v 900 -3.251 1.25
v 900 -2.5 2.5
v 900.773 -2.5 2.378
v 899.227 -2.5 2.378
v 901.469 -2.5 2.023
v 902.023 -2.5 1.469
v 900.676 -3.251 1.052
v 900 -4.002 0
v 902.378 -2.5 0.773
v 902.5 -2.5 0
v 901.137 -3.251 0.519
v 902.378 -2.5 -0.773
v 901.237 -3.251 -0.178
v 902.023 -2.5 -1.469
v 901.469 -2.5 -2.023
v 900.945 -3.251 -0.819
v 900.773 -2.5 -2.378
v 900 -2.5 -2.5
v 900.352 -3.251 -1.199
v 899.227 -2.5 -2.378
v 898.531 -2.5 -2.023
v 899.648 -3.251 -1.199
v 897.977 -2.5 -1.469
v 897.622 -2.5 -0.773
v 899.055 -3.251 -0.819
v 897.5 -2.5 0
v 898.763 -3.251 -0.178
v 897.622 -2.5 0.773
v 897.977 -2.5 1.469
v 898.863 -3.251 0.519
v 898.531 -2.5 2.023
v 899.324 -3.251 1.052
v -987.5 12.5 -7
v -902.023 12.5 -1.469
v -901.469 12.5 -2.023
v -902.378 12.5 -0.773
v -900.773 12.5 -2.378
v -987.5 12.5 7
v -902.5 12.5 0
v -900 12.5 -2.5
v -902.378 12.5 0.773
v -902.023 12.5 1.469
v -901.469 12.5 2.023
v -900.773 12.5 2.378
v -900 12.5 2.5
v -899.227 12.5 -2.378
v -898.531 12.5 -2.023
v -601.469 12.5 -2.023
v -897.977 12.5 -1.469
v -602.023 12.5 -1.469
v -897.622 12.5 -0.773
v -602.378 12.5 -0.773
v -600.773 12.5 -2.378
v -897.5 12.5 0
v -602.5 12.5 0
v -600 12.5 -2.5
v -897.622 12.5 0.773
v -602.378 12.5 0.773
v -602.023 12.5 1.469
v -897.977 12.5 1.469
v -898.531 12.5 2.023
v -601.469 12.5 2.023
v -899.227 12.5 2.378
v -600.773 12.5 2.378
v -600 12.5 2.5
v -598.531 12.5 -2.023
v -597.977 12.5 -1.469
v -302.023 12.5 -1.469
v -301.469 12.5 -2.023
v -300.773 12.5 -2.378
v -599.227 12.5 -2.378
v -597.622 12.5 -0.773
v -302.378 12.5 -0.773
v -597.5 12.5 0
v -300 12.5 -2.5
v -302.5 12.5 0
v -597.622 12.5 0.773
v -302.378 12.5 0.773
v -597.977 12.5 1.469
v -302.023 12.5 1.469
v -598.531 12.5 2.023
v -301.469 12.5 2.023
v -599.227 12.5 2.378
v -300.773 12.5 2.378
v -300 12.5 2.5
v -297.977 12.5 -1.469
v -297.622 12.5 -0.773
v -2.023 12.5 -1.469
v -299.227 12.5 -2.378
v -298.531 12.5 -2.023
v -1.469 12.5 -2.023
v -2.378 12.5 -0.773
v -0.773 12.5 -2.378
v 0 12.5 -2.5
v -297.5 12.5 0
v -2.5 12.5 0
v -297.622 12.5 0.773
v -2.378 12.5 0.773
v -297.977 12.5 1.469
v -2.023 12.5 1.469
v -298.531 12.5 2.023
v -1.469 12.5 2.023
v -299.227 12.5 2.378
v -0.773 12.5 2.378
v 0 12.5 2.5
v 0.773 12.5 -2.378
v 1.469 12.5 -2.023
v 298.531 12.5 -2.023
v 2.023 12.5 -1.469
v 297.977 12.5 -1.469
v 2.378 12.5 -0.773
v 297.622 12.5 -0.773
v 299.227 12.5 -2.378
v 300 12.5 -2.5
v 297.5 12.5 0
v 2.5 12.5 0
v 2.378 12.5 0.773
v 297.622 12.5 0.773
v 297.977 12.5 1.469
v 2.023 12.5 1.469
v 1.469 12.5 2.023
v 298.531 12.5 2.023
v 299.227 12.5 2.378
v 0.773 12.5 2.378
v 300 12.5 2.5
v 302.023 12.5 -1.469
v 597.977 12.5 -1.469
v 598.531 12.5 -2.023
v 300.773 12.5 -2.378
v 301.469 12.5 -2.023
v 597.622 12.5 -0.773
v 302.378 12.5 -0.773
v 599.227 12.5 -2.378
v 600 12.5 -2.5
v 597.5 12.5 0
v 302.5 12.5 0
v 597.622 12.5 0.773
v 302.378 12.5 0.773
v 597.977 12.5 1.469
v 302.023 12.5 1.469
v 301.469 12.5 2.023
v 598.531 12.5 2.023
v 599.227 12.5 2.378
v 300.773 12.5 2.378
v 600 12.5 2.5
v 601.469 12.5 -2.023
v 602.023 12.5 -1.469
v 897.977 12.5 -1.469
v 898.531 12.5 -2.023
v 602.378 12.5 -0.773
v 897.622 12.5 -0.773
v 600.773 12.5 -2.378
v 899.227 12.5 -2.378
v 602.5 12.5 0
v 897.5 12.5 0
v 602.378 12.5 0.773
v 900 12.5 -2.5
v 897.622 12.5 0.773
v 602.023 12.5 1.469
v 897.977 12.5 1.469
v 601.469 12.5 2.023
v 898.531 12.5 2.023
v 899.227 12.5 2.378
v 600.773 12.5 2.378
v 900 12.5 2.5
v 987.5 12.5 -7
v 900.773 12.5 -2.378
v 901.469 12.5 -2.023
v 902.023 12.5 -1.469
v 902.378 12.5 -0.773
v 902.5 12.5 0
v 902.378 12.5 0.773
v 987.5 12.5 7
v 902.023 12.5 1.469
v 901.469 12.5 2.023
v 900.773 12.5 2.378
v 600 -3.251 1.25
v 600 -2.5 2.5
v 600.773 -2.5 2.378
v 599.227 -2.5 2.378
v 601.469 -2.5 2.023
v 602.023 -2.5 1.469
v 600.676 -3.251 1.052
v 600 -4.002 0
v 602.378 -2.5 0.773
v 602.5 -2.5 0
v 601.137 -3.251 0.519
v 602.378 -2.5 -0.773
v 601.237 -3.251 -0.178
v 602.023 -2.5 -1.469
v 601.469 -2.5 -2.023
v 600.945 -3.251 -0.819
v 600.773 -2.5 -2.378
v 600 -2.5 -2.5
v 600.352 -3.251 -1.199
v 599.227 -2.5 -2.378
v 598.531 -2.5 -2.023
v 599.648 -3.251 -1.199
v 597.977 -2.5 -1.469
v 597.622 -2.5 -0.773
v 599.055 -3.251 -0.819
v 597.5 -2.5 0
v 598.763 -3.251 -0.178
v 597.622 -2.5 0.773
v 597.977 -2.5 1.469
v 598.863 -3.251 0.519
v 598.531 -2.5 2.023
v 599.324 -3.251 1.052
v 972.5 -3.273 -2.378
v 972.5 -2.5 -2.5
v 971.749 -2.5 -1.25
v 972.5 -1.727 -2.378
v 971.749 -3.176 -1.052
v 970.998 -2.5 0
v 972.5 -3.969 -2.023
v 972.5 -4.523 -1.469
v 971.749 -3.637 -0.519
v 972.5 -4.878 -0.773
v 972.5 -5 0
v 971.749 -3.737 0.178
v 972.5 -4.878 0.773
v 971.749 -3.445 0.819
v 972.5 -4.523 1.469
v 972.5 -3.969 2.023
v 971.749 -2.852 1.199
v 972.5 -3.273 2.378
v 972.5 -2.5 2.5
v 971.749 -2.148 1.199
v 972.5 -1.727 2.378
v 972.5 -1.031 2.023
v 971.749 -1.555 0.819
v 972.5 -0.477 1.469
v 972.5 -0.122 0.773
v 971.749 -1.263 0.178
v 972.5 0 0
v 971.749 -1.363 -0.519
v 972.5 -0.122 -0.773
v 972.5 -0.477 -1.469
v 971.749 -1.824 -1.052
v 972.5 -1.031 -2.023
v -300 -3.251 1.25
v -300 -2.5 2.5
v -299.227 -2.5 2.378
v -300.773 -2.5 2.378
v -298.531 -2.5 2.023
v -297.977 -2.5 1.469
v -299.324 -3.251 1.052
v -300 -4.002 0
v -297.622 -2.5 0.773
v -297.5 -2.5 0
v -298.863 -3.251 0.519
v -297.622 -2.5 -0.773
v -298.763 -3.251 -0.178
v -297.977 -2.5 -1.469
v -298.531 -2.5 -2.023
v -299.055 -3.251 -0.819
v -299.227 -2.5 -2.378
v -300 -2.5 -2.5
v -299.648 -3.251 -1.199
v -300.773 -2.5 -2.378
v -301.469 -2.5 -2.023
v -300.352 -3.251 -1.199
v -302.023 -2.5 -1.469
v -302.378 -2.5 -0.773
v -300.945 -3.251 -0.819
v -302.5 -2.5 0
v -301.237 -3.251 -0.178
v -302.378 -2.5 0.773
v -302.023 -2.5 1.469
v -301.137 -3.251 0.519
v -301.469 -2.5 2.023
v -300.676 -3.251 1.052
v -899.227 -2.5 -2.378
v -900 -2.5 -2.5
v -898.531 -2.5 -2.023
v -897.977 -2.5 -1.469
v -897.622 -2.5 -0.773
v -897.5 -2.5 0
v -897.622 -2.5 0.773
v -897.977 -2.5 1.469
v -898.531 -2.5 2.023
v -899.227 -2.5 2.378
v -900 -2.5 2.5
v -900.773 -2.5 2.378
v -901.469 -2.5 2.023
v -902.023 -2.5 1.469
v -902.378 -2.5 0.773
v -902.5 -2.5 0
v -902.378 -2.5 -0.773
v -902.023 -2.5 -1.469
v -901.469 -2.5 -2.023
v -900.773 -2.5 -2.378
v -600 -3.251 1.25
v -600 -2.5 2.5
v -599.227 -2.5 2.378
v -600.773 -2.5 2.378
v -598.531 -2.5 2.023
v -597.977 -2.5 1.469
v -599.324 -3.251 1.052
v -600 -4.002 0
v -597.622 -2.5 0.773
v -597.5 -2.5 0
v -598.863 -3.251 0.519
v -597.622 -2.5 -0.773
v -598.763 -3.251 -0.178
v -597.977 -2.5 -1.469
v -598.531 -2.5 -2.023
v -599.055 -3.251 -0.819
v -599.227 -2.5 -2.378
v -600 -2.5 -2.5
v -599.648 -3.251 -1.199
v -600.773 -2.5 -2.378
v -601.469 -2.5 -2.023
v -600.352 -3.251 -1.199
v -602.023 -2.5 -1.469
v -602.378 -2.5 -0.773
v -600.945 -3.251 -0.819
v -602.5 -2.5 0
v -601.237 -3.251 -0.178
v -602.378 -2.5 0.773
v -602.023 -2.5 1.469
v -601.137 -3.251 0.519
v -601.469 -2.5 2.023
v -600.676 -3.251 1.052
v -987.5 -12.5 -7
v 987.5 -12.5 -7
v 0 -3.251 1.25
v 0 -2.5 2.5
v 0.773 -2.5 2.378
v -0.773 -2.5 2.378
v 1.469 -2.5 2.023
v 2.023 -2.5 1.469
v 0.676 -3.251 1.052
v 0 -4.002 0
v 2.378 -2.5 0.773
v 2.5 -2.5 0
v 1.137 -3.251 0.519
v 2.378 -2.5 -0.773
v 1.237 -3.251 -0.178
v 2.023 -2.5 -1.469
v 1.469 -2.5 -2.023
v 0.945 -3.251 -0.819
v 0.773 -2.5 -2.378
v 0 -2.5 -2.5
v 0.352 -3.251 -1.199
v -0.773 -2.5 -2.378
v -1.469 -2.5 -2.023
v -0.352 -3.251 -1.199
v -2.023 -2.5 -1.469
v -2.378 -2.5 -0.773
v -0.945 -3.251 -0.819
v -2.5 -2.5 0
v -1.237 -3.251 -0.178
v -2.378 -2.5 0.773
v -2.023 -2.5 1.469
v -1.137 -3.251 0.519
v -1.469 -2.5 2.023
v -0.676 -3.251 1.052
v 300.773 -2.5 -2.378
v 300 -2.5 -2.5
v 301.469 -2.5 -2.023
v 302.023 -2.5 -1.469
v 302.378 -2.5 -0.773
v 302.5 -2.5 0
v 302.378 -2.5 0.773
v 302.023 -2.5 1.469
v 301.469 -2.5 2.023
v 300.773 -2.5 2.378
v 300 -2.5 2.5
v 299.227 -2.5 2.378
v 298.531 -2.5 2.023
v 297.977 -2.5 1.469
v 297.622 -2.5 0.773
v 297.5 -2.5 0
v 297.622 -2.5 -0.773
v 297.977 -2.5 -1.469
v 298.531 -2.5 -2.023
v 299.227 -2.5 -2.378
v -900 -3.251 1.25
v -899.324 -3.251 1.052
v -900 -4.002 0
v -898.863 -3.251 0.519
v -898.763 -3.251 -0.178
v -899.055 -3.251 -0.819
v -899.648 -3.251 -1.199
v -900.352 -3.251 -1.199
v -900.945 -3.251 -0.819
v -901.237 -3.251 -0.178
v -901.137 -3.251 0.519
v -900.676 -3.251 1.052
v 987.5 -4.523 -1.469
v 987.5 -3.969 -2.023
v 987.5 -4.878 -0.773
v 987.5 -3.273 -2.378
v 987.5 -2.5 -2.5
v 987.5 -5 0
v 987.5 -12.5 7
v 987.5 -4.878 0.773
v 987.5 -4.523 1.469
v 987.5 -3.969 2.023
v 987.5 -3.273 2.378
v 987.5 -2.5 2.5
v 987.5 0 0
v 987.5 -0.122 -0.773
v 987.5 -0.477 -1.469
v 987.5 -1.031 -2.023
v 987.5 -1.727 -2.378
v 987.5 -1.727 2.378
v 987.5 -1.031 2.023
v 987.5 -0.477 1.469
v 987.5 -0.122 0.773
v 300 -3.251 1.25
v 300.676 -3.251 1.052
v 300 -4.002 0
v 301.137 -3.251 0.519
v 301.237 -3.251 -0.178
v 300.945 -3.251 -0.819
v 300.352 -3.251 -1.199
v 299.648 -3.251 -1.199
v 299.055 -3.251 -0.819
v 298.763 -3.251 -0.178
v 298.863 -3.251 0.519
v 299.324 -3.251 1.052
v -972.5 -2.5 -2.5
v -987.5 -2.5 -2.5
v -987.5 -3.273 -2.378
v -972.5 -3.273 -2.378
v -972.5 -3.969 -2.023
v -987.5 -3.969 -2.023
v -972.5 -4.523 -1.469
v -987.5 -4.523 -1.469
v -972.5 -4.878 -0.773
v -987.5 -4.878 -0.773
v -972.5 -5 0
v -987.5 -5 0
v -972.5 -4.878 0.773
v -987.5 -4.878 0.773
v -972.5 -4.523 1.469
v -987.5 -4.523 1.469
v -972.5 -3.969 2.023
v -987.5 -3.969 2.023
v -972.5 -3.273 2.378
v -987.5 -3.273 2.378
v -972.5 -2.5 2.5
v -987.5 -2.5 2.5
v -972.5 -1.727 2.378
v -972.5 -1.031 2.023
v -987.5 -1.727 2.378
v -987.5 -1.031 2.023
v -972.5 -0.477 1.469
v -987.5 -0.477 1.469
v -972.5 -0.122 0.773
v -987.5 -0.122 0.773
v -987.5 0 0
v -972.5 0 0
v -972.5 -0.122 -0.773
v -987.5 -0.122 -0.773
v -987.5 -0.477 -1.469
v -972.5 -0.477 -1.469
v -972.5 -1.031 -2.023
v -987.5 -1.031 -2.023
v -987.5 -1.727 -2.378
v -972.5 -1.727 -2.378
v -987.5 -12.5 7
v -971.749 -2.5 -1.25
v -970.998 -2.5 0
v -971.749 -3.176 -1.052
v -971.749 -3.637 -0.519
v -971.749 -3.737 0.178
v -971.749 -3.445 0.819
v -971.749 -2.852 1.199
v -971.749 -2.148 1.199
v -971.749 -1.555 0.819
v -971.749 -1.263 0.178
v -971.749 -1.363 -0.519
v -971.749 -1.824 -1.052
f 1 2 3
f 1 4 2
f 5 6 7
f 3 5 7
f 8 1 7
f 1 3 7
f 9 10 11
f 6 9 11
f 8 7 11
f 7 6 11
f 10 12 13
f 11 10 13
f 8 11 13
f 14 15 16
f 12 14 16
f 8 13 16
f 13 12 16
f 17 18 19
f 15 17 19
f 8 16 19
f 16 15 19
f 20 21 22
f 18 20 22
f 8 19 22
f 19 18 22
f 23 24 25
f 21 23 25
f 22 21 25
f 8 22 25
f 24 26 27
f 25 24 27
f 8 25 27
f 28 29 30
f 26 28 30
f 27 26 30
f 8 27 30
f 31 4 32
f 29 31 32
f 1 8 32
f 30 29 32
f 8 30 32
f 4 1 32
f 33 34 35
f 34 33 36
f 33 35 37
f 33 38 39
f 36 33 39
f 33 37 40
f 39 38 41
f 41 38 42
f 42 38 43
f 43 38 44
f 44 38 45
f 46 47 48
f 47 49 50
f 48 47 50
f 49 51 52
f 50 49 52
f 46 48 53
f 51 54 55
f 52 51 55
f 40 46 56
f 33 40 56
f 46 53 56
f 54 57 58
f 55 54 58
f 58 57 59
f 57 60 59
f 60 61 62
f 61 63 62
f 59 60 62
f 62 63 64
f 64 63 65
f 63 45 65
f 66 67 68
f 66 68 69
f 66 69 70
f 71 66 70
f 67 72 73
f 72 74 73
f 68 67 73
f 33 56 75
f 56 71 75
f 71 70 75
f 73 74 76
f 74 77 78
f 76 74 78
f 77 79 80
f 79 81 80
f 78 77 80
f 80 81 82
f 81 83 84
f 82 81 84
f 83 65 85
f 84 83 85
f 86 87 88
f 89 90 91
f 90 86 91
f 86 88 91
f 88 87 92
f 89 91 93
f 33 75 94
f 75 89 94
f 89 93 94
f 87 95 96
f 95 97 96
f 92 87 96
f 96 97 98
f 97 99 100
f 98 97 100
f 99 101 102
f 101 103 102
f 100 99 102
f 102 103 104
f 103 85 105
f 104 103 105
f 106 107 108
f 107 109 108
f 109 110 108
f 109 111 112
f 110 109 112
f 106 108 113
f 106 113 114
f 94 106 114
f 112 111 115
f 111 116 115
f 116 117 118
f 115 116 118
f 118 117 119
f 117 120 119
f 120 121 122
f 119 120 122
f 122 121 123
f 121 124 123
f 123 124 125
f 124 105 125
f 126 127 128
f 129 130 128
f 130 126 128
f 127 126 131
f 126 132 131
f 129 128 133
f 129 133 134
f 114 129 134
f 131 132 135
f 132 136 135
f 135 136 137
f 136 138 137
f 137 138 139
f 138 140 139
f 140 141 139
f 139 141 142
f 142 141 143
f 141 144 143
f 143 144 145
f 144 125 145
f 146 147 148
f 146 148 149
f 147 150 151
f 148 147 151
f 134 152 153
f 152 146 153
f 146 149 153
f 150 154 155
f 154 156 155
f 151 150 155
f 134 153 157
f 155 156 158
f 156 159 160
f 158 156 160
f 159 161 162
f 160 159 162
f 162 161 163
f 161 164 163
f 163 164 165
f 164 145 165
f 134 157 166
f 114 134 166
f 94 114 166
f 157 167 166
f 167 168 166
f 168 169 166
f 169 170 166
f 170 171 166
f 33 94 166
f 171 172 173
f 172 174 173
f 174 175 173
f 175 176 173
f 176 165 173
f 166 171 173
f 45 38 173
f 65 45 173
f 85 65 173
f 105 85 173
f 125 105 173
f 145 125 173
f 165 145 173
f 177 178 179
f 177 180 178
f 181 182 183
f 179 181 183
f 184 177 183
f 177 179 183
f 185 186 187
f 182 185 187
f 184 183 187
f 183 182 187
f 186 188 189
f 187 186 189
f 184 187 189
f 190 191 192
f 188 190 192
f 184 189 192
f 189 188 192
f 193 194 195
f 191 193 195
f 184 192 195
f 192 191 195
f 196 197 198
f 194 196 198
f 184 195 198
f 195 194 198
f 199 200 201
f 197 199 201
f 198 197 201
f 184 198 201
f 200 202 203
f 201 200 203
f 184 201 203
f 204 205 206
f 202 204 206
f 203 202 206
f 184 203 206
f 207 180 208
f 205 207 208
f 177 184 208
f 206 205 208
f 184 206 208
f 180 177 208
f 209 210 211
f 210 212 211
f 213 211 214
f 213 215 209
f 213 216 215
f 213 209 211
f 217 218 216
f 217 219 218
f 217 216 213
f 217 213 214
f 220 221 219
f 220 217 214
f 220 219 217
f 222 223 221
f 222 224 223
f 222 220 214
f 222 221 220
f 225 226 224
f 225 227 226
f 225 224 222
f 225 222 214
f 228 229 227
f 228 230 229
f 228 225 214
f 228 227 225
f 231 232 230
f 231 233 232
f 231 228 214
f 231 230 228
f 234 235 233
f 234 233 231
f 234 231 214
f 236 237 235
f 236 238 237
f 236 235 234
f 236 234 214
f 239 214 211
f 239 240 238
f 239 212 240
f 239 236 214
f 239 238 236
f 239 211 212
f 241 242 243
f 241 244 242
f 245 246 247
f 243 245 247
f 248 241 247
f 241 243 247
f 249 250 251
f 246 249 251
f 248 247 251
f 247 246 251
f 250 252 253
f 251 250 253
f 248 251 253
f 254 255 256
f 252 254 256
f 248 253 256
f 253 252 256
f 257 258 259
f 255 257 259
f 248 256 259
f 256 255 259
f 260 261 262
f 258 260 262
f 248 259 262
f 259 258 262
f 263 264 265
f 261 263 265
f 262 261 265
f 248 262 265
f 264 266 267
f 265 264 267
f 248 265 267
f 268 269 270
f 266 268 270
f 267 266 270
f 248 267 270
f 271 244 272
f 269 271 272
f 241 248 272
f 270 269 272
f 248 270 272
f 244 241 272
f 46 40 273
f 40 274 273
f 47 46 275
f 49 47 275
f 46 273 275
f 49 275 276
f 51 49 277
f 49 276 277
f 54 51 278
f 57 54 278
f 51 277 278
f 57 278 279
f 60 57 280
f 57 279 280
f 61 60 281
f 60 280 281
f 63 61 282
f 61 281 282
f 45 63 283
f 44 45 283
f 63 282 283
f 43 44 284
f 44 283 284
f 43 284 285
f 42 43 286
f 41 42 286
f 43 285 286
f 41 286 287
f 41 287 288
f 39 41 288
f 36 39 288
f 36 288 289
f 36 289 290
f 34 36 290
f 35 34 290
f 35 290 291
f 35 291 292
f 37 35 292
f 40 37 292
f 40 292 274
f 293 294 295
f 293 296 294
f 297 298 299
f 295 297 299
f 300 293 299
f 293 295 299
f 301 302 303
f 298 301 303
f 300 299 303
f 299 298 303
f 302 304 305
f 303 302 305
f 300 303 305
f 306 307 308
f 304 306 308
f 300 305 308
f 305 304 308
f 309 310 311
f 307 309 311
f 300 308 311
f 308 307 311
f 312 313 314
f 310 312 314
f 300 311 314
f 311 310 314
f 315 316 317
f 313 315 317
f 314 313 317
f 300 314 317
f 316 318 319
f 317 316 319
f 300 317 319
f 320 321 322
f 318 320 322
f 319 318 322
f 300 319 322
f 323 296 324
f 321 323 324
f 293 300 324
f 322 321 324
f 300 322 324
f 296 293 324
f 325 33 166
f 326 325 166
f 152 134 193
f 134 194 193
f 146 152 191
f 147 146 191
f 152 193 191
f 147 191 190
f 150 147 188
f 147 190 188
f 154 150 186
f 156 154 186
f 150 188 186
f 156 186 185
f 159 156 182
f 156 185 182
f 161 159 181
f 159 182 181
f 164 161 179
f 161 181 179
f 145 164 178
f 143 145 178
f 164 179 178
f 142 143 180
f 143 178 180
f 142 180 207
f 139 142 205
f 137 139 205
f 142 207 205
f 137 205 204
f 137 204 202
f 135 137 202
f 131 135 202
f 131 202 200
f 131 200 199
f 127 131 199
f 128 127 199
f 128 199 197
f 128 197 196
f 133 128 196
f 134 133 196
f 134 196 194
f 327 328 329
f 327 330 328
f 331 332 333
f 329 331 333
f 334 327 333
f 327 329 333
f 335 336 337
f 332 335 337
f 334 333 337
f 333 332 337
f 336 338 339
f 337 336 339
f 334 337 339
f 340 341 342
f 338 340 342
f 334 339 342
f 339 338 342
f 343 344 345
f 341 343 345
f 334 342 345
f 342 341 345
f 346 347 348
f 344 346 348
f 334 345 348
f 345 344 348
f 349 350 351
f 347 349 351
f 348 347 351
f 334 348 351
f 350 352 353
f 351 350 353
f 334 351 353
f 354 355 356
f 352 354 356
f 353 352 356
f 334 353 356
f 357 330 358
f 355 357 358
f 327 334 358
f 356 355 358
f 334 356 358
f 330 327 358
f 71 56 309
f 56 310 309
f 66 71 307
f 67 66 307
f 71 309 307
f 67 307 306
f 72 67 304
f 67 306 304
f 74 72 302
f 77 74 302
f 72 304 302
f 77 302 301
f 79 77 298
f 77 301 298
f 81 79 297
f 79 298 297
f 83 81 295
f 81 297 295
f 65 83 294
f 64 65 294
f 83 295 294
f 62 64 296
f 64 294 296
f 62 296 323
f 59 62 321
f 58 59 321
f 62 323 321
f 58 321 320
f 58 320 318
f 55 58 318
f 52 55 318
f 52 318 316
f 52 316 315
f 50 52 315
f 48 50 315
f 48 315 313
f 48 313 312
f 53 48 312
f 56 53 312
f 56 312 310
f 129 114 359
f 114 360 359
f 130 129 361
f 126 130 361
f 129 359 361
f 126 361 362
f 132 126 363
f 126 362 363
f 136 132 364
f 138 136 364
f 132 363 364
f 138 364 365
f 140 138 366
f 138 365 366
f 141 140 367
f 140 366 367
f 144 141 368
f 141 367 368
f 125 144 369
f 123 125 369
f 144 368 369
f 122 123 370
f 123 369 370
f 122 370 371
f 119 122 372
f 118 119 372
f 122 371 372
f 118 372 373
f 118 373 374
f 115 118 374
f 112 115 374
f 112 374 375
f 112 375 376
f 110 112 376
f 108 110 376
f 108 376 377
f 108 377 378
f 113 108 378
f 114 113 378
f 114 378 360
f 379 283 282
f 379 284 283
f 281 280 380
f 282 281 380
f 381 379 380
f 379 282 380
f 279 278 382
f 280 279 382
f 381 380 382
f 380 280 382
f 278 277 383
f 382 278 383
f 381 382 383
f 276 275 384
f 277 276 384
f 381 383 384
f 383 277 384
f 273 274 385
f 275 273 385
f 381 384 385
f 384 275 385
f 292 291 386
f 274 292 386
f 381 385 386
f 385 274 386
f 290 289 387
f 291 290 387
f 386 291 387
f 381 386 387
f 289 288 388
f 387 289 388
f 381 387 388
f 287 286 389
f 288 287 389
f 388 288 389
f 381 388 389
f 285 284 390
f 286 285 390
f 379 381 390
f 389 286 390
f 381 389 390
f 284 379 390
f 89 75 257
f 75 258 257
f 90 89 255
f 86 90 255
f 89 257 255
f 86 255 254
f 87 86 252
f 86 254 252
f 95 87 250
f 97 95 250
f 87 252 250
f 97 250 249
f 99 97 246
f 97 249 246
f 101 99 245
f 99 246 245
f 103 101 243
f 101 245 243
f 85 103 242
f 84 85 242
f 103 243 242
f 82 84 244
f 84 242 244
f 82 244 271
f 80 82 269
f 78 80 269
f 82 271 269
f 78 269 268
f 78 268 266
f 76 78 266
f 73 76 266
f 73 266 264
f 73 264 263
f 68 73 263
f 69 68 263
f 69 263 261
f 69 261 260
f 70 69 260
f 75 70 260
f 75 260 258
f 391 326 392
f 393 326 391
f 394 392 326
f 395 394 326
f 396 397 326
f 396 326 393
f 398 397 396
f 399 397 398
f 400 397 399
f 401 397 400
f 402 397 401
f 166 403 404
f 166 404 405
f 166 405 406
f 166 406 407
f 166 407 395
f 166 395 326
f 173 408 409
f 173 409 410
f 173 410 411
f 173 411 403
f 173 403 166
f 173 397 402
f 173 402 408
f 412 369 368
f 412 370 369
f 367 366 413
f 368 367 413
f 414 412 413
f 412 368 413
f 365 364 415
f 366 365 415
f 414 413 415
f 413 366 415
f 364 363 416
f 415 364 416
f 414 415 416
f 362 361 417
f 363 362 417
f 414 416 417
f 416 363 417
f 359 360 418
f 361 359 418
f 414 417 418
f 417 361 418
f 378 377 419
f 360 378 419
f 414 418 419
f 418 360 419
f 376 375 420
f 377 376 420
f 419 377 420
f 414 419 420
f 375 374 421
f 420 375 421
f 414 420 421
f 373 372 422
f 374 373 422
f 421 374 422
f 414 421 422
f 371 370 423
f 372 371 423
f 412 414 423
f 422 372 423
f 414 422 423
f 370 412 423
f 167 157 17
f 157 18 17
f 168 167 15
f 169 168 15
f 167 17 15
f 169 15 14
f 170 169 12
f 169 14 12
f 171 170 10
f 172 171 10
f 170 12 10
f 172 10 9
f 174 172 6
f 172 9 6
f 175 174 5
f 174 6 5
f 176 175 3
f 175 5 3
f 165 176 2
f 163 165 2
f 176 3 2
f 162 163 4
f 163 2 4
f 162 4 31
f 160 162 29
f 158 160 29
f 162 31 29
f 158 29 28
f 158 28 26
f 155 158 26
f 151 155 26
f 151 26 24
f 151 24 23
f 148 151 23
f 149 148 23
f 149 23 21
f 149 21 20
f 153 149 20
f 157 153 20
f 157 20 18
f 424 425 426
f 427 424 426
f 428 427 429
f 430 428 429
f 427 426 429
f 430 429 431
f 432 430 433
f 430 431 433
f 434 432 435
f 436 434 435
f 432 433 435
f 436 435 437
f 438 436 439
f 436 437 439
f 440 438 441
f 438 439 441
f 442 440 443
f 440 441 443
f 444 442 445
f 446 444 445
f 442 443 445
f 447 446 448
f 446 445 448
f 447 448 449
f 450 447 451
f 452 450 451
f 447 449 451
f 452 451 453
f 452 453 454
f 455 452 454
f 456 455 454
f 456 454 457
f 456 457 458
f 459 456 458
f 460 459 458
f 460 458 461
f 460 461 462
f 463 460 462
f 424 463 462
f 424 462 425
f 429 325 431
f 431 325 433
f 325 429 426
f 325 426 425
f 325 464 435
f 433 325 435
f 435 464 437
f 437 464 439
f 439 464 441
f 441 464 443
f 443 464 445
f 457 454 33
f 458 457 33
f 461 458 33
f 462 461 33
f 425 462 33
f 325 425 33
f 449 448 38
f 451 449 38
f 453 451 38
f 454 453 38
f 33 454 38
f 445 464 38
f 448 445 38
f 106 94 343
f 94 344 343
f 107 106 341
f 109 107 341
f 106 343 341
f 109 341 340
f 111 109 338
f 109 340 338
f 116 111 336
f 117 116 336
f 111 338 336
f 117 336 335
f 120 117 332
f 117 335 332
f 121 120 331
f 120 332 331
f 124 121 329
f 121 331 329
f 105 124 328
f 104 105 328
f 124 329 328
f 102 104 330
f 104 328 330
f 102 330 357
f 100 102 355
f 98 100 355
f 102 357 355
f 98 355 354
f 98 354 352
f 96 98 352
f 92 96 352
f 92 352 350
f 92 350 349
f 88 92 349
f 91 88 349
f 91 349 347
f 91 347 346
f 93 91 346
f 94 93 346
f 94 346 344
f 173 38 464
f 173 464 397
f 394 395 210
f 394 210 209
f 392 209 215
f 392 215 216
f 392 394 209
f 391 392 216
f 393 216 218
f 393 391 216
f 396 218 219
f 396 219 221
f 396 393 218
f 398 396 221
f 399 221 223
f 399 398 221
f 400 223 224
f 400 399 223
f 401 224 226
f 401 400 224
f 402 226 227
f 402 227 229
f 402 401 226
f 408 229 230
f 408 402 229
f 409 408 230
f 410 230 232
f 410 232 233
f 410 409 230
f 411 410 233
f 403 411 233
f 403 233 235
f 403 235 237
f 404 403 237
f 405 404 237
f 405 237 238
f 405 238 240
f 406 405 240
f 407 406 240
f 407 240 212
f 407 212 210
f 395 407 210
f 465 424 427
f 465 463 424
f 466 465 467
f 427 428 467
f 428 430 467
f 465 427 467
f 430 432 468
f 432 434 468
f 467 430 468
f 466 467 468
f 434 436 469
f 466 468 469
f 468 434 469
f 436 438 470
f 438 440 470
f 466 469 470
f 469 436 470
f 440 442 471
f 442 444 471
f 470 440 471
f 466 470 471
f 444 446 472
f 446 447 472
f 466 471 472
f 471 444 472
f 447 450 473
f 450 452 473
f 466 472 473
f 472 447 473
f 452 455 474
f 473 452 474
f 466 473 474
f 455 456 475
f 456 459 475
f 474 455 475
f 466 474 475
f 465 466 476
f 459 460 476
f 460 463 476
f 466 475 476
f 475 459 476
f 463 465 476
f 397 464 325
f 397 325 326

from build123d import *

# Parameters (mm, degrees)
SKETCH_1_W             = 1975
SKETCH_1_H             = 25
EXTRUDE_1_DEPTH        = 7
HOLE_WIZARD_M6_1_D     = 5
HOLE_WIZARD_M6_1_DEPTH = 15
HOLE_WIZARD_M6_1_TIP   = 1.502151548


with BuildPart() as part:
    # 草图1 → 凸台-拉伸1 (new body, symmetric)
    with BuildSketch(Plane.XY):
        Rectangle(SKETCH_1_W, SKETCH_1_H)
    extrude(amount=EXTRUDE_1_DEPTH, both=True)

    # M6 螺纹孔1
    with Locations(Plane(origin=(-900, 12.5, 0), x_dir=(0, 0, 1), z_dir=(0, 1, 0))):
        with Locations((0, 0), (0, 300), (0, 600), (0, 1800), (0, 1500), (0, 1200), (0, 900)):
            Hole(HOLE_WIZARD_M6_1_D / 2, depth=HOLE_WIZARD_M6_1_DEPTH)
            with Locations((0, 0, -(HOLE_WIZARD_M6_1_DEPTH + HOLE_WIZARD_M6_1_TIP / 2))):  # 118° drill point
                Cone(0, HOLE_WIZARD_M6_1_D / 2, HOLE_WIZARD_M6_1_TIP, mode=Mode.SUBTRACT)

    # 草图6 → M6 螺纹孔2 (revolve, cut)
    with BuildSketch(Plane(origin=(987.5, -2.5, 0), x_dir=(0, 0, -1), z_dir=(0, 1, 0))):
        Polygon((0, 0), (0, 16.502151548), (2.5, 15), (2.5, 0), align=None)
    hole_wizard_m6_2 = revolve(axis=Axis((993.85, -2.5, 0), (-1, 0, 0)), mode=Mode.SUBTRACT)

    # 镜向1: M6 螺纹孔2 across plane
    add(hole_wizard_m6_2.mirror(Plane(origin=(0, 0, 0), x_dir=(0, 0, 1), z_dir=(1, 0, 0))), mode=Mode.SUBTRACT)

    # 镜向2 copy 1 sketch → 镜向2 copy 1 (revolve, cut)
    with BuildSketch(Plane(origin=(987.5, -2.5, 0), x_dir=(0, 0, -1), z_dir=(0, 1, 0))):
        Polygon((0, 0), (0, 16.502151548), (2.5, 15), (2.5, 0), align=None)
    revolve(axis=Axis((993.85, -2.5, 0), (-1, 0, 0)), mode=Mode.SUBTRACT)

    # 镜向2 copy 2 sketch → 镜向2 copy 2 (revolve, cut)
    with BuildSketch(Plane(origin=(-987.5, -2.5, 0), x_dir=(0, 0, -1), z_dir=(0, 1, 0))):
        Polygon((0, 0), (0, -16.502151548), (2.5, -15), (2.5, 0), align=None)
    revolve(axis=Axis((-993.85, -2.5, 0), (-1, 0, 0)), mode=Mode.SUBTRACT)


solid = part.part
